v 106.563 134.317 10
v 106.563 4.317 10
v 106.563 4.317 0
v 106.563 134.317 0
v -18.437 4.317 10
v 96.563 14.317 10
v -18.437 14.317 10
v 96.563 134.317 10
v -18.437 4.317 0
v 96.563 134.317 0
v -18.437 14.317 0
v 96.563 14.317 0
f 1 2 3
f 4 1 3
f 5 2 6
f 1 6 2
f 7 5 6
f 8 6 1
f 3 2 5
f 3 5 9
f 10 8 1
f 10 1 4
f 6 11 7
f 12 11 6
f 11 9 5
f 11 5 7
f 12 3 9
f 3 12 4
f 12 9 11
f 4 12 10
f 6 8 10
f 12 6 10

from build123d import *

# Parameters (mm, degrees)
ESQUISSE1_W        = 115
ESQUISSE1_H        = 10
BOSS_EXTRU_1_DEPTH = 10
ESQUISSE2_W        = 10
ESQUISSE2_H        = 130
BOSS_EXTRU_2_DEPTH = 10


with BuildPart() as part:
    # Esquisse1 → Boss.-Extru.1 (new body)
    with BuildSketch(Plane.XY):
        with Locations((39.062768353, 9.317091479)):
            Rectangle(ESQUISSE1_W, ESQUISSE1_H)
    extrude(amount=BOSS_EXTRU_1_DEPTH)

    # Esquisse2 → Boss.-Extru.2 (add)
    with BuildSketch(Plane(origin=(96.562768353, 0, 0), x_dir=(0, 0, -1), z_dir=(1, 0, 0))):
        with Locations((-5, 69.317091479)):
            Rectangle(ESQUISSE2_W, ESQUISSE2_H)
    extrude(amount=BOSS_EXTRU_2_DEPTH)


solid = part.part
